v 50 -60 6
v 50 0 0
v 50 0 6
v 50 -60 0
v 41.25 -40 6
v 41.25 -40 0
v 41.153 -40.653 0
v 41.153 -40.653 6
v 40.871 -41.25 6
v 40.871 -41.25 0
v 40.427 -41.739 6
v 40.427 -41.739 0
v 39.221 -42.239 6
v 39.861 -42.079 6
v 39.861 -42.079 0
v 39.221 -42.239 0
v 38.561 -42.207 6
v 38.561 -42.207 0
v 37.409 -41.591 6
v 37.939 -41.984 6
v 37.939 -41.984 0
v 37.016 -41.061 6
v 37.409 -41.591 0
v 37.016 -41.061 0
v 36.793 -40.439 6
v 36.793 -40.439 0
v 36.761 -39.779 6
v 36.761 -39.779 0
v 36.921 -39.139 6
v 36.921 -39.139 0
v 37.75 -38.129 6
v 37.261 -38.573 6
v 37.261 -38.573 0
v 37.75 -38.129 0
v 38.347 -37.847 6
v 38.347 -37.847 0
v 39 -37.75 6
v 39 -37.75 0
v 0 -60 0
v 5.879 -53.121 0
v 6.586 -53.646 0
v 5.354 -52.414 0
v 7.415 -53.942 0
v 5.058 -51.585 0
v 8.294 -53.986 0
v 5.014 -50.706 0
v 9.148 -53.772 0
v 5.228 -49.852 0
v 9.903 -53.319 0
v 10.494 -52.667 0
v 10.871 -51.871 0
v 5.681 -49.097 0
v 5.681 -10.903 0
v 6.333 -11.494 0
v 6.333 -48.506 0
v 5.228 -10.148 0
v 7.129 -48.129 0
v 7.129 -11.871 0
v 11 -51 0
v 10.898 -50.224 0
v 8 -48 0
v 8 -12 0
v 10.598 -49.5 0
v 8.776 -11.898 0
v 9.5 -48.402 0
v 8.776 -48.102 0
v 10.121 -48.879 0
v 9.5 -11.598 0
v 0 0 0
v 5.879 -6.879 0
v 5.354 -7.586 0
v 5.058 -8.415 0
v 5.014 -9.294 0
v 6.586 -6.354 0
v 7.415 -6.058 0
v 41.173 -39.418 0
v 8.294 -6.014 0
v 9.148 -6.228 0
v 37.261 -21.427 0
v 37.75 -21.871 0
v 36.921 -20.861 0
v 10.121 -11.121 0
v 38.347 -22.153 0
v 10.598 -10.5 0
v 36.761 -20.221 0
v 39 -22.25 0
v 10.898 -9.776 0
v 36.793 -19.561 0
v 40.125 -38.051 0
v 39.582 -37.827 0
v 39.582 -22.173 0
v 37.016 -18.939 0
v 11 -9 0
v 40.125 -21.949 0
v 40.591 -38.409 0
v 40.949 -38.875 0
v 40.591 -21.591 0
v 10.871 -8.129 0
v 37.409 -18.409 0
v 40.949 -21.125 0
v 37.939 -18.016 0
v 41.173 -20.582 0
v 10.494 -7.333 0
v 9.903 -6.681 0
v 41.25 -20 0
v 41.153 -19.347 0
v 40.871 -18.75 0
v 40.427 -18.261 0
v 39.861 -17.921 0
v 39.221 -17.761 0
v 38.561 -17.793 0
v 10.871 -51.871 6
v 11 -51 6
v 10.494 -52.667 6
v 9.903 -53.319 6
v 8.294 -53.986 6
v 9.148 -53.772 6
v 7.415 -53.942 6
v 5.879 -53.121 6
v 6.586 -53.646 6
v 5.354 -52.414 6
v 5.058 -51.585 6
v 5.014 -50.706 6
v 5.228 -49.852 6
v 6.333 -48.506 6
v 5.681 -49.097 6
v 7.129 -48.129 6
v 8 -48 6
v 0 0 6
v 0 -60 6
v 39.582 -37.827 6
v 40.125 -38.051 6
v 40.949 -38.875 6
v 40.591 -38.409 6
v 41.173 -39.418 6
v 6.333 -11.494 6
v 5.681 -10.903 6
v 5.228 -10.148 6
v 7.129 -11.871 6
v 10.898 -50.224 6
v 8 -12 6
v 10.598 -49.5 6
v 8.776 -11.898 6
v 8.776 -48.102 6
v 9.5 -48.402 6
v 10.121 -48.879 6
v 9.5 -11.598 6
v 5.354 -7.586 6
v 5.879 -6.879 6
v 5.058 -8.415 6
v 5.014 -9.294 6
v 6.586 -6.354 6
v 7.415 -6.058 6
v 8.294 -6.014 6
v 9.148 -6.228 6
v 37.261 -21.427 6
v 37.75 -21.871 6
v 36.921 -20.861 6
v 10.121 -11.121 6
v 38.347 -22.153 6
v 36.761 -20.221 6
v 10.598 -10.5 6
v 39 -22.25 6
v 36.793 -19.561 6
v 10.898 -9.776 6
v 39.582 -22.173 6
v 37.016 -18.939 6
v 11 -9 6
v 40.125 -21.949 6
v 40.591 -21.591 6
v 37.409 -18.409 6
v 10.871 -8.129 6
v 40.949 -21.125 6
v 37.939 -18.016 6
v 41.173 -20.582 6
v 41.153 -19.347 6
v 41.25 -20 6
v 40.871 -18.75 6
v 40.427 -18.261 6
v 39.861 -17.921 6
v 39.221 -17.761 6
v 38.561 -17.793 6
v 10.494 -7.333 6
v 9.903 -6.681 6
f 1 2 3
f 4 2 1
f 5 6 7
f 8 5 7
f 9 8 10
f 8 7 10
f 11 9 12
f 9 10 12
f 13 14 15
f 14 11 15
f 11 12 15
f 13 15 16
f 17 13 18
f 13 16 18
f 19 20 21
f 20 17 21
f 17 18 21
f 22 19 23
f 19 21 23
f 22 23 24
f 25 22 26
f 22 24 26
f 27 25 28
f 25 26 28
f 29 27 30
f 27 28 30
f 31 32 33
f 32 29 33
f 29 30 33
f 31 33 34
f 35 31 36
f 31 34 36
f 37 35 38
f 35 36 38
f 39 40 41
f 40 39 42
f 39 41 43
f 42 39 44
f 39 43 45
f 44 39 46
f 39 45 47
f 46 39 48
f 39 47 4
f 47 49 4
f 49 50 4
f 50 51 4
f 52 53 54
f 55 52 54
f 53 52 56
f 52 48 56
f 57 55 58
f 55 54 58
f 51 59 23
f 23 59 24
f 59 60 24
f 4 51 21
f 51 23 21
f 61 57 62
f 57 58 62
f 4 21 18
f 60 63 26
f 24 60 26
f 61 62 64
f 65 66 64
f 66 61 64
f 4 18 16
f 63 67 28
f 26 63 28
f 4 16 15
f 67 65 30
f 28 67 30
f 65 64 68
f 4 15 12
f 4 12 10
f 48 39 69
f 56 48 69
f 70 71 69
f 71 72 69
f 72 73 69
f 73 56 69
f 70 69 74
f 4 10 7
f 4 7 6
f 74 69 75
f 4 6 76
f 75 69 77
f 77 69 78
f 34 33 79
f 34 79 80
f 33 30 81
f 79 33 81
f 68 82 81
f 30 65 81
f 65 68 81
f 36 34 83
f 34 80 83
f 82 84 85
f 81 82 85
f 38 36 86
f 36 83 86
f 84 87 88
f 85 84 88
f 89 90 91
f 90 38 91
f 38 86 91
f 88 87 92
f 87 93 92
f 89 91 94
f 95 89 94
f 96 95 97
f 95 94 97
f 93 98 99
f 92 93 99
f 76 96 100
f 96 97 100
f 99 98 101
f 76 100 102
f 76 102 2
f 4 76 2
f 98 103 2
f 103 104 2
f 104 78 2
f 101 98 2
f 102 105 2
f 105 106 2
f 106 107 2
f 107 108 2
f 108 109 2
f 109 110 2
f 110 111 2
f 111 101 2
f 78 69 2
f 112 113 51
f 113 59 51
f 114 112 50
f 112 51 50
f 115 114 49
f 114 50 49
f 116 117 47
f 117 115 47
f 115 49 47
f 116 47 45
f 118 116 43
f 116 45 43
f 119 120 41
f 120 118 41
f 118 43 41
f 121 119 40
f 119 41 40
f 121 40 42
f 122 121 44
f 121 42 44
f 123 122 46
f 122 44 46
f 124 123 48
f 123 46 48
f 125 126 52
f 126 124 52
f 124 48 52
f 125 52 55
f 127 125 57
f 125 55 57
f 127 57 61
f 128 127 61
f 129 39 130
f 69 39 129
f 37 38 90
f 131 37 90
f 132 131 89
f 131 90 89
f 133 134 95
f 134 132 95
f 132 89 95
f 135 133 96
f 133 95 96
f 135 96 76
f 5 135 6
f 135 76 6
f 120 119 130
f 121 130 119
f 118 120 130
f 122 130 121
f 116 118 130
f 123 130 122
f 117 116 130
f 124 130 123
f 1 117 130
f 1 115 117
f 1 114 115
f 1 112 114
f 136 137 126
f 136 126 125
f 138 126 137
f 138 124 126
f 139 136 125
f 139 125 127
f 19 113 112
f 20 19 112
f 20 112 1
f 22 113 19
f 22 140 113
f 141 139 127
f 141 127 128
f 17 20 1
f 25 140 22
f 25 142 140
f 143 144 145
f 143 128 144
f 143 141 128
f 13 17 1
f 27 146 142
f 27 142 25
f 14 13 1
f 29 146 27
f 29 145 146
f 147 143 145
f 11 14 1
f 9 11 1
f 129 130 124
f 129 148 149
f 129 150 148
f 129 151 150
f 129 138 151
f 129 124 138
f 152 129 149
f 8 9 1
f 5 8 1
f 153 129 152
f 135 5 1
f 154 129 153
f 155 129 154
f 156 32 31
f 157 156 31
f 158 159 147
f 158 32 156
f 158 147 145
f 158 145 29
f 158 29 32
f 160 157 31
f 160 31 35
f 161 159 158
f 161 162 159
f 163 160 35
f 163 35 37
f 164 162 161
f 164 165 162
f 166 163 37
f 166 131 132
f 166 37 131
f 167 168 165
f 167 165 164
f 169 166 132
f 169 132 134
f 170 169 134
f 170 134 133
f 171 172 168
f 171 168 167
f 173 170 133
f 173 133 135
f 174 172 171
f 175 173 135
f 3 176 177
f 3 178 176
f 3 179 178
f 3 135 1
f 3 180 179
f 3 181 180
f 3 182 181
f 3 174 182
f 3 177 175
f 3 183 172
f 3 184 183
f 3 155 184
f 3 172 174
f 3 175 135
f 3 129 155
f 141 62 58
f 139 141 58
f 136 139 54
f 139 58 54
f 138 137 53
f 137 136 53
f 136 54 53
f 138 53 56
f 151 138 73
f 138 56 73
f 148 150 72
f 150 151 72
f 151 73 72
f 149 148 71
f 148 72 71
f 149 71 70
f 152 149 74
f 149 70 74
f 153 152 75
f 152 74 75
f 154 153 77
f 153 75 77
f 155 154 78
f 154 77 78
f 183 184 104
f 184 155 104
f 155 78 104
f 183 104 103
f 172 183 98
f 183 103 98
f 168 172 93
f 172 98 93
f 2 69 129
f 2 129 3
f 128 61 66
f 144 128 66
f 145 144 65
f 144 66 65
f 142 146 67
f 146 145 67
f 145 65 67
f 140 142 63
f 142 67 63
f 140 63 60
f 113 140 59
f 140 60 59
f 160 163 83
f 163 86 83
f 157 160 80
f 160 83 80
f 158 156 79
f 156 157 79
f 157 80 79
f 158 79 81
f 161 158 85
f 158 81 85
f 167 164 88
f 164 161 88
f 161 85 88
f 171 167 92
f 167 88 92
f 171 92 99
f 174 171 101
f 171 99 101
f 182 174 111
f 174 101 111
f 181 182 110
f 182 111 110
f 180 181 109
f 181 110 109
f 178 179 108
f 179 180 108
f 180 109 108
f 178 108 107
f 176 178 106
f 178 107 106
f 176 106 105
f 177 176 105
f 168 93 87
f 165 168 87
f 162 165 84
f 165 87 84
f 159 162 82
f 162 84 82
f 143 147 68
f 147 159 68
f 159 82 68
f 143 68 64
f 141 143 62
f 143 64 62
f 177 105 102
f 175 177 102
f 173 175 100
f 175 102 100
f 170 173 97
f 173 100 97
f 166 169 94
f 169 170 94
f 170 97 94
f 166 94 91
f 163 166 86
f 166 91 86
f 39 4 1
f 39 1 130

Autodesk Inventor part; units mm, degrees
ref_plane "YZ Plane" through (0, 0, 0) normal (1, 0, 0) x (0, 1, 0)
ref_plane "XZ Plane" through (0, 0, 0) normal (0, 1, 0) x (-1, 0, 0)
ref_plane "XY Plane" through (0, 0, 0) normal (0, 0, 1) x (1, 0, 0)
sketch "Sketch1" plane through (0, 0, 0) normal (0, 0, 1) x (1, 0, 0)
  line L0 (0, 0) -> (50, 0)
  line L1 (50, 0) -> (50, -60)
  line L2 (50, -60) -> (0, -60)
  line L3 (0, -60) -> (0, 0)
  circle A0 centre (8, -51) radius 3
  circle A1 centre (8, -9) radius 3
  line L4 (8, -51) -> (8, -9)
  circle A2 centre (39, -40) radius 2.25
  circle A3 centre (39, -20) radius 2.25
  line L5 (39, -40) -> (39, -20)
  dimension "d0" = 50
  dimension "d3" = 60
  dimension "d4" = 6
  dimension "d5" = 6
  dimension "d6" = 42
  dimension "d7" = 8
  dimension "d8" = 9
  dimension "d9" = 4.5
  dimension "d10" = 4.5
  dimension "d11" = 20
  dimension "d12" = 11
  dimension "d13" = 20
extrude "Extrusion1" add sketch "Sketch1" along normal blind 6
equation "\"d8\" = -0.5 * d6 + 0.5 * d3"
equation "\"d13\" = -0.5 * d11 + 0.5 * d3"
properties part number "plateencoder" material "PMMA Plastic"
